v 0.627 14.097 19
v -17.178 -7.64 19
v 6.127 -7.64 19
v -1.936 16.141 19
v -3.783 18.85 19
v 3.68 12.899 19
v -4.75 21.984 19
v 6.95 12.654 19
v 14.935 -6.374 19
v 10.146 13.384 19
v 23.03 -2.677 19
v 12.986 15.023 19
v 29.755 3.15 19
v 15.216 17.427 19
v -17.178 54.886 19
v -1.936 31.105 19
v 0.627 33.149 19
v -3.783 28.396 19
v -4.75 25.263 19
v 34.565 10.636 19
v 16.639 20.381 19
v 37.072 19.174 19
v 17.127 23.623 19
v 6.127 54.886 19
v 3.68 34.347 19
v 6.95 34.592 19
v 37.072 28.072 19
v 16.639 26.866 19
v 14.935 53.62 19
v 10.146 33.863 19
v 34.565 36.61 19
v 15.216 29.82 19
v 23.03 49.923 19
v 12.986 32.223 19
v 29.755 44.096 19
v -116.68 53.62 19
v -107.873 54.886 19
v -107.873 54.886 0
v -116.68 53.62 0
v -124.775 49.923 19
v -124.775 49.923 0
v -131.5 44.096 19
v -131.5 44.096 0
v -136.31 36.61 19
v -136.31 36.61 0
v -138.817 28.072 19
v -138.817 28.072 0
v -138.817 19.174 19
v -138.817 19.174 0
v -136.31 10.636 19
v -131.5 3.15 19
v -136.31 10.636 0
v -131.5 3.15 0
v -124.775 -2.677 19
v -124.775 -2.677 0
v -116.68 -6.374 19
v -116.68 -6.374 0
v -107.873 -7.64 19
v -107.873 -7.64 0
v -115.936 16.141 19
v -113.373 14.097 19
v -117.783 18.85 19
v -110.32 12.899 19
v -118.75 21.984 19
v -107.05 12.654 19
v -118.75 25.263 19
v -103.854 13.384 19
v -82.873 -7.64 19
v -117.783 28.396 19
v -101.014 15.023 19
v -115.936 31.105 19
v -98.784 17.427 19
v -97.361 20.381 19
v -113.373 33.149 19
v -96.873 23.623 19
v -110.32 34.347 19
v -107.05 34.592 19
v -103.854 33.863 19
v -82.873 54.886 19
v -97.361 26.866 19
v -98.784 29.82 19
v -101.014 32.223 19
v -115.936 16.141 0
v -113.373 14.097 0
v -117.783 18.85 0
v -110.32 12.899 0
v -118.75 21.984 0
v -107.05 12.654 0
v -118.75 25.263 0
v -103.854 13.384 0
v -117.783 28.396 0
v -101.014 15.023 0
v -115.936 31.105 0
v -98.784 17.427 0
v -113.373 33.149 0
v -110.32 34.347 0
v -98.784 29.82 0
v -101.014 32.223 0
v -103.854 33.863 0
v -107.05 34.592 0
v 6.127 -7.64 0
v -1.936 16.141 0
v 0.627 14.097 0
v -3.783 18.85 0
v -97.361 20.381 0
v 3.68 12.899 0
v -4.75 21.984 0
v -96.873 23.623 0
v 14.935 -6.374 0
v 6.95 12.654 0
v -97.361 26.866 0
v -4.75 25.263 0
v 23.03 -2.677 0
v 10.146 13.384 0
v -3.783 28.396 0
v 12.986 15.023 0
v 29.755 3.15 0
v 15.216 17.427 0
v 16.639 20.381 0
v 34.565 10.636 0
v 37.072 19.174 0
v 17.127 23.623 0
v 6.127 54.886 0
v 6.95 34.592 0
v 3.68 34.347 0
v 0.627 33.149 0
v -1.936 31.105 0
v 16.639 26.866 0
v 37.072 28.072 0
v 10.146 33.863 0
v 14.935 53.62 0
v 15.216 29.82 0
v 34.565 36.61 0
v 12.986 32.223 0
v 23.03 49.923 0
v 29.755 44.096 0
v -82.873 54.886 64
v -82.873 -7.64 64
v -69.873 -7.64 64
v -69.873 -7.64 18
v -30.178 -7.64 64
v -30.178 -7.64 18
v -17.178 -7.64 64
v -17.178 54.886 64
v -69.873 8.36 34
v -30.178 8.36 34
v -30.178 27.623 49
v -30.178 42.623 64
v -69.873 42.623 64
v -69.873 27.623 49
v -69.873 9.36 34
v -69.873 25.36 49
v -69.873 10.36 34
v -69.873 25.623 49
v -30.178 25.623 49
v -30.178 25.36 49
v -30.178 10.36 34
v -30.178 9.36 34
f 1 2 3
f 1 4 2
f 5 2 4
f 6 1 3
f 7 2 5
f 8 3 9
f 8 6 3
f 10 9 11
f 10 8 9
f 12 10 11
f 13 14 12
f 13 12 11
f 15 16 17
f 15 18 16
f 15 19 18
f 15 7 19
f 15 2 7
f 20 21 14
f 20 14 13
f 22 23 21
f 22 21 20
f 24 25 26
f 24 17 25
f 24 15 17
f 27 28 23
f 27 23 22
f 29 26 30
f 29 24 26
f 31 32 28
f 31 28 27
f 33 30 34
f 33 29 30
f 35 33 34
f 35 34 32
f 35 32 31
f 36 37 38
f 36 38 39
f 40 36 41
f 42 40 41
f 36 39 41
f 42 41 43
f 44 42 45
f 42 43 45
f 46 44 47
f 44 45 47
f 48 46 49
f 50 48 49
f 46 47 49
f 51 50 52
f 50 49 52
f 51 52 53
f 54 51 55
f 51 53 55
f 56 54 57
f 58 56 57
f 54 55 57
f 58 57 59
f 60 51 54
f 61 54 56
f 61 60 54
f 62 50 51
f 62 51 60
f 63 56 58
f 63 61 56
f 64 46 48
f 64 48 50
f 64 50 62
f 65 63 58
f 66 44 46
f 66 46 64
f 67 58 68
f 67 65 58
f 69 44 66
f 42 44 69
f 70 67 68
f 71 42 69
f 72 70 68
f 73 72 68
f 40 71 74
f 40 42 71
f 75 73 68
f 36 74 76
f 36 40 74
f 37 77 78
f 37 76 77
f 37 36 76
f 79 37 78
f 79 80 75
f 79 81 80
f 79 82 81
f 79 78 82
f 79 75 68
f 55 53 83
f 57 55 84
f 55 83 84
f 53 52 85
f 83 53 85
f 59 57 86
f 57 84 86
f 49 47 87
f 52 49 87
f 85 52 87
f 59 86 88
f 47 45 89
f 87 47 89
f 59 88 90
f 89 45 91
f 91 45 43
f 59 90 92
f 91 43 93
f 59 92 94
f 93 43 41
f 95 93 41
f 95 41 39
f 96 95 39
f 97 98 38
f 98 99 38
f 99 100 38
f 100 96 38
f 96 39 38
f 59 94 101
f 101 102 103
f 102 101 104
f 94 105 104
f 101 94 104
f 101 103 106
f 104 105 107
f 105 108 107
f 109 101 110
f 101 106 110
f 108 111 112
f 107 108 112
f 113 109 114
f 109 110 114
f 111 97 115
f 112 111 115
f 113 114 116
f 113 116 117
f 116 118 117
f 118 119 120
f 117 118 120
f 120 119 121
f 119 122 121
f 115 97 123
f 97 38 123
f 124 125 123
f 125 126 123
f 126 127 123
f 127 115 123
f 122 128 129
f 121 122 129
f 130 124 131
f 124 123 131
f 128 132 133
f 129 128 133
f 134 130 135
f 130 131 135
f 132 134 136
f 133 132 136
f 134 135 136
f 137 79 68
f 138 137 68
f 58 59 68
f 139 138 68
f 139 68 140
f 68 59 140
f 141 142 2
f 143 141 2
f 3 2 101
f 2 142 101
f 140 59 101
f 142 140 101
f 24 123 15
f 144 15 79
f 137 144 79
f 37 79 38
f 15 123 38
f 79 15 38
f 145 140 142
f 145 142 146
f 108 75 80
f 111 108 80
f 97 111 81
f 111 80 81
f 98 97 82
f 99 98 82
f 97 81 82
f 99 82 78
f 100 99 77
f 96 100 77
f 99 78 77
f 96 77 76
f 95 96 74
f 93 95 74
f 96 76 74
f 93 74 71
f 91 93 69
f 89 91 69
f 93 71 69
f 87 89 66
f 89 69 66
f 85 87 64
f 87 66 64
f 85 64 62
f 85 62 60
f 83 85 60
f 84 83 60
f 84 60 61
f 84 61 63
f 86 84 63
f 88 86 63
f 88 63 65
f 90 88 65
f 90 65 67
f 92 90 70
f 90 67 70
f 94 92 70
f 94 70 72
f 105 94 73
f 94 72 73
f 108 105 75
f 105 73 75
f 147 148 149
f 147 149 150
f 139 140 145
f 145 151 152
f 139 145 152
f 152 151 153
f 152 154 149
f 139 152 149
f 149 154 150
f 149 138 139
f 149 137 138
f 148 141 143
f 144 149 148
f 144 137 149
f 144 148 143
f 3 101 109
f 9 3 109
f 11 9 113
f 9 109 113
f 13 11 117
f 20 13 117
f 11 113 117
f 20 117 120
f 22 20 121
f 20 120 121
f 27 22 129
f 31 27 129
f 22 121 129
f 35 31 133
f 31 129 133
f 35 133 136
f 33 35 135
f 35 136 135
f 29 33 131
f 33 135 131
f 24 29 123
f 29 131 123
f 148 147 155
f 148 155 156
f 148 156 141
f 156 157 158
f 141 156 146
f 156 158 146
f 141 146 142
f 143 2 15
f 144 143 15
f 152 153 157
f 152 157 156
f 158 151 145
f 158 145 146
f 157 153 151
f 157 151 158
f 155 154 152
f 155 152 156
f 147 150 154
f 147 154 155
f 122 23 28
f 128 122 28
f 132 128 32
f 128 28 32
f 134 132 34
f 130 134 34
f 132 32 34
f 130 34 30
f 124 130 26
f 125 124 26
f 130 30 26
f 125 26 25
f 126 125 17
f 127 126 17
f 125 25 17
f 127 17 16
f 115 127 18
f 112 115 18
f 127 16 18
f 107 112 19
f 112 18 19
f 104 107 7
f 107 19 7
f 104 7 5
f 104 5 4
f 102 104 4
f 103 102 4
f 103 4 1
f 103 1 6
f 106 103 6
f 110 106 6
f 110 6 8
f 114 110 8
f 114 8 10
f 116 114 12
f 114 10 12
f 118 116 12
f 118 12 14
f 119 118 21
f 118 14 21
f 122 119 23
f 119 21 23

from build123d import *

# Parameters (mm, degrees)
F1_DEPTH     = 19
F2_R         = 11
F3_DEPTH     = 19
F5_DEPTH     = 45
F6_W         = 39.6946725957
F6_H         = 17
F7_DEPTH     = 15
F8_W         = 39.6946725957
F8_H         = 16.2631579523
F9_DEPTH     = 30
F10_T1_DEPTH = 39.6946725957
F10_T6_DEPTH = 39.6946725957
F11_W        = 39.6946725957
F11_H        = 16.2631579523
F12_DEPTH    = 45
F13_T4_DEPTH = 39.6946725957


# Not quite as in the source:
# - a fillet or chamfer that OpenCascade refuses, or shapes differently, is made with other operations: its cross-section is extruded or revolved along the edge and cut away or added


with BuildPart() as f1:
    # F0 (on Top) → F1 (new body)
    with BuildSketch(Plane.XY):
        with BuildLine():
            ThreePointArc((-107.8725005202, 54.8863680974), (-139.1356584725, 23.6232101452), (-107.8725005202, -7.6399478071))
            Line((-107.8725005202, -7.6399478071), (6.1274994798, -7.6399478071))
            ThreePointArc((6.1274994798, -7.6399478071), (37.3906574321, 23.6232101452), (6.1274994798, 54.8863680974))
            Line((6.1274994798, 54.8863680974), (-107.8725005202, 54.8863680974))
        make_face()
    extrude(amount=F1_DEPTH)

    # F2 (on face) → F3 (cut)
    with BuildSketch(Plane.XY.offset(19)):
        with Locations((-107.8725005202, 23.6232101452)):
            Circle(F2_R)
        with Locations((6.1274994798, 23.6232101452)):
            Circle(F2_R)
    extrude(amount=-F3_DEPTH, mode=Mode.SUBTRACT)

    # F4 (on face) → F5 (join)
    with BuildSketch(Plane.XY.offset(19)):
        Polygon((-17.1778279245, 54.8863680974), (-82.8725005202, 54.8863680974), (-82.8725005202, -7.6399478071), (-69.8725005202, -7.6399478071), (-69.8725005202, 41.8863680974), (-30.1778279245, 41.8863680974), (-30.1778279245, -7.6399478071), (-17.1778279245, -7.6399478071), align=None)
    extrude(amount=F5_DEPTH)

    # F6 (on face) → F7 (join)
    with BuildSketch(Plane.XY.offset(19)):
        with Locations((-50.0251642223, 0.8600521929)):
            Rectangle(F6_W, F6_H)
    extrude(amount=F7_DEPTH)

    # F8 (on face) → F9 (join)
    with BuildSketch(Plane.XY.offset(19)):
        with Locations((-50.0251642223, 17.491631169)):
            Rectangle(F8_W, F8_H)
    extrude(amount=F9_DEPTH)

    # F10: chamfer of 16 on 2 edges, made by hand

    # F10_s2 → F10_t1 (cut)
    with BuildSketch(Plane.YZ.offset(-69.8725005202)):
        Polygon((-7.6399478071, 18), (8.3600521929, 34), (-7.6399478071, 34), align=None)
    extrude(amount=F10_T1_DEPTH, mode=Mode.SUBTRACT)


with BuildPart() as f10_tool4:
    # F10_s5 → F10_t6 (new body)
    with BuildSketch(Plane.YZ.offset(-69.8725005202)):
        Polygon((9.3600521929, 33), (25.3600521929, 49), (9.3600521929, 49), align=None)
    extrude(amount=F10_T6_DEPTH)

    split(bisect_by=Plane.XY.offset(34), keep=Keep.TOP)


with BuildPart() as f1_1:
    add(f1.part)

    # F10_t3: cut F10_tool4
    add(f10_tool4.part, mode=Mode.SUBTRACT)

    # F11 (on face) → F12 (join)
    with BuildSketch(Plane.XY.offset(19)):
        with Locations((-50.0251642223, 33.7547891213)):
            Rectangle(F11_W, F11_H)
    extrude(amount=F12_DEPTH)

    # F13: chamfer of 17 on 1 edges, made by hand


with BuildPart() as f13_tool2:
    # F13_s3 → F13_t4 (new body)
    with BuildSketch(Plane.YZ.offset(-69.8725005202)):
        Polygon((42.6232101452, 64), (25.6232101452, 47), (25.6232101452, 64), align=None)
    extrude(amount=F13_T4_DEPTH)

    split(bisect_by=Plane.XY.offset(49), keep=Keep.TOP)


with BuildPart() as f1_2:
    add(f1_1.part)

    # F13_t1: cut F13_tool2
    add(f13_tool2.part, mode=Mode.SUBTRACT)


solid = f1_2.part
